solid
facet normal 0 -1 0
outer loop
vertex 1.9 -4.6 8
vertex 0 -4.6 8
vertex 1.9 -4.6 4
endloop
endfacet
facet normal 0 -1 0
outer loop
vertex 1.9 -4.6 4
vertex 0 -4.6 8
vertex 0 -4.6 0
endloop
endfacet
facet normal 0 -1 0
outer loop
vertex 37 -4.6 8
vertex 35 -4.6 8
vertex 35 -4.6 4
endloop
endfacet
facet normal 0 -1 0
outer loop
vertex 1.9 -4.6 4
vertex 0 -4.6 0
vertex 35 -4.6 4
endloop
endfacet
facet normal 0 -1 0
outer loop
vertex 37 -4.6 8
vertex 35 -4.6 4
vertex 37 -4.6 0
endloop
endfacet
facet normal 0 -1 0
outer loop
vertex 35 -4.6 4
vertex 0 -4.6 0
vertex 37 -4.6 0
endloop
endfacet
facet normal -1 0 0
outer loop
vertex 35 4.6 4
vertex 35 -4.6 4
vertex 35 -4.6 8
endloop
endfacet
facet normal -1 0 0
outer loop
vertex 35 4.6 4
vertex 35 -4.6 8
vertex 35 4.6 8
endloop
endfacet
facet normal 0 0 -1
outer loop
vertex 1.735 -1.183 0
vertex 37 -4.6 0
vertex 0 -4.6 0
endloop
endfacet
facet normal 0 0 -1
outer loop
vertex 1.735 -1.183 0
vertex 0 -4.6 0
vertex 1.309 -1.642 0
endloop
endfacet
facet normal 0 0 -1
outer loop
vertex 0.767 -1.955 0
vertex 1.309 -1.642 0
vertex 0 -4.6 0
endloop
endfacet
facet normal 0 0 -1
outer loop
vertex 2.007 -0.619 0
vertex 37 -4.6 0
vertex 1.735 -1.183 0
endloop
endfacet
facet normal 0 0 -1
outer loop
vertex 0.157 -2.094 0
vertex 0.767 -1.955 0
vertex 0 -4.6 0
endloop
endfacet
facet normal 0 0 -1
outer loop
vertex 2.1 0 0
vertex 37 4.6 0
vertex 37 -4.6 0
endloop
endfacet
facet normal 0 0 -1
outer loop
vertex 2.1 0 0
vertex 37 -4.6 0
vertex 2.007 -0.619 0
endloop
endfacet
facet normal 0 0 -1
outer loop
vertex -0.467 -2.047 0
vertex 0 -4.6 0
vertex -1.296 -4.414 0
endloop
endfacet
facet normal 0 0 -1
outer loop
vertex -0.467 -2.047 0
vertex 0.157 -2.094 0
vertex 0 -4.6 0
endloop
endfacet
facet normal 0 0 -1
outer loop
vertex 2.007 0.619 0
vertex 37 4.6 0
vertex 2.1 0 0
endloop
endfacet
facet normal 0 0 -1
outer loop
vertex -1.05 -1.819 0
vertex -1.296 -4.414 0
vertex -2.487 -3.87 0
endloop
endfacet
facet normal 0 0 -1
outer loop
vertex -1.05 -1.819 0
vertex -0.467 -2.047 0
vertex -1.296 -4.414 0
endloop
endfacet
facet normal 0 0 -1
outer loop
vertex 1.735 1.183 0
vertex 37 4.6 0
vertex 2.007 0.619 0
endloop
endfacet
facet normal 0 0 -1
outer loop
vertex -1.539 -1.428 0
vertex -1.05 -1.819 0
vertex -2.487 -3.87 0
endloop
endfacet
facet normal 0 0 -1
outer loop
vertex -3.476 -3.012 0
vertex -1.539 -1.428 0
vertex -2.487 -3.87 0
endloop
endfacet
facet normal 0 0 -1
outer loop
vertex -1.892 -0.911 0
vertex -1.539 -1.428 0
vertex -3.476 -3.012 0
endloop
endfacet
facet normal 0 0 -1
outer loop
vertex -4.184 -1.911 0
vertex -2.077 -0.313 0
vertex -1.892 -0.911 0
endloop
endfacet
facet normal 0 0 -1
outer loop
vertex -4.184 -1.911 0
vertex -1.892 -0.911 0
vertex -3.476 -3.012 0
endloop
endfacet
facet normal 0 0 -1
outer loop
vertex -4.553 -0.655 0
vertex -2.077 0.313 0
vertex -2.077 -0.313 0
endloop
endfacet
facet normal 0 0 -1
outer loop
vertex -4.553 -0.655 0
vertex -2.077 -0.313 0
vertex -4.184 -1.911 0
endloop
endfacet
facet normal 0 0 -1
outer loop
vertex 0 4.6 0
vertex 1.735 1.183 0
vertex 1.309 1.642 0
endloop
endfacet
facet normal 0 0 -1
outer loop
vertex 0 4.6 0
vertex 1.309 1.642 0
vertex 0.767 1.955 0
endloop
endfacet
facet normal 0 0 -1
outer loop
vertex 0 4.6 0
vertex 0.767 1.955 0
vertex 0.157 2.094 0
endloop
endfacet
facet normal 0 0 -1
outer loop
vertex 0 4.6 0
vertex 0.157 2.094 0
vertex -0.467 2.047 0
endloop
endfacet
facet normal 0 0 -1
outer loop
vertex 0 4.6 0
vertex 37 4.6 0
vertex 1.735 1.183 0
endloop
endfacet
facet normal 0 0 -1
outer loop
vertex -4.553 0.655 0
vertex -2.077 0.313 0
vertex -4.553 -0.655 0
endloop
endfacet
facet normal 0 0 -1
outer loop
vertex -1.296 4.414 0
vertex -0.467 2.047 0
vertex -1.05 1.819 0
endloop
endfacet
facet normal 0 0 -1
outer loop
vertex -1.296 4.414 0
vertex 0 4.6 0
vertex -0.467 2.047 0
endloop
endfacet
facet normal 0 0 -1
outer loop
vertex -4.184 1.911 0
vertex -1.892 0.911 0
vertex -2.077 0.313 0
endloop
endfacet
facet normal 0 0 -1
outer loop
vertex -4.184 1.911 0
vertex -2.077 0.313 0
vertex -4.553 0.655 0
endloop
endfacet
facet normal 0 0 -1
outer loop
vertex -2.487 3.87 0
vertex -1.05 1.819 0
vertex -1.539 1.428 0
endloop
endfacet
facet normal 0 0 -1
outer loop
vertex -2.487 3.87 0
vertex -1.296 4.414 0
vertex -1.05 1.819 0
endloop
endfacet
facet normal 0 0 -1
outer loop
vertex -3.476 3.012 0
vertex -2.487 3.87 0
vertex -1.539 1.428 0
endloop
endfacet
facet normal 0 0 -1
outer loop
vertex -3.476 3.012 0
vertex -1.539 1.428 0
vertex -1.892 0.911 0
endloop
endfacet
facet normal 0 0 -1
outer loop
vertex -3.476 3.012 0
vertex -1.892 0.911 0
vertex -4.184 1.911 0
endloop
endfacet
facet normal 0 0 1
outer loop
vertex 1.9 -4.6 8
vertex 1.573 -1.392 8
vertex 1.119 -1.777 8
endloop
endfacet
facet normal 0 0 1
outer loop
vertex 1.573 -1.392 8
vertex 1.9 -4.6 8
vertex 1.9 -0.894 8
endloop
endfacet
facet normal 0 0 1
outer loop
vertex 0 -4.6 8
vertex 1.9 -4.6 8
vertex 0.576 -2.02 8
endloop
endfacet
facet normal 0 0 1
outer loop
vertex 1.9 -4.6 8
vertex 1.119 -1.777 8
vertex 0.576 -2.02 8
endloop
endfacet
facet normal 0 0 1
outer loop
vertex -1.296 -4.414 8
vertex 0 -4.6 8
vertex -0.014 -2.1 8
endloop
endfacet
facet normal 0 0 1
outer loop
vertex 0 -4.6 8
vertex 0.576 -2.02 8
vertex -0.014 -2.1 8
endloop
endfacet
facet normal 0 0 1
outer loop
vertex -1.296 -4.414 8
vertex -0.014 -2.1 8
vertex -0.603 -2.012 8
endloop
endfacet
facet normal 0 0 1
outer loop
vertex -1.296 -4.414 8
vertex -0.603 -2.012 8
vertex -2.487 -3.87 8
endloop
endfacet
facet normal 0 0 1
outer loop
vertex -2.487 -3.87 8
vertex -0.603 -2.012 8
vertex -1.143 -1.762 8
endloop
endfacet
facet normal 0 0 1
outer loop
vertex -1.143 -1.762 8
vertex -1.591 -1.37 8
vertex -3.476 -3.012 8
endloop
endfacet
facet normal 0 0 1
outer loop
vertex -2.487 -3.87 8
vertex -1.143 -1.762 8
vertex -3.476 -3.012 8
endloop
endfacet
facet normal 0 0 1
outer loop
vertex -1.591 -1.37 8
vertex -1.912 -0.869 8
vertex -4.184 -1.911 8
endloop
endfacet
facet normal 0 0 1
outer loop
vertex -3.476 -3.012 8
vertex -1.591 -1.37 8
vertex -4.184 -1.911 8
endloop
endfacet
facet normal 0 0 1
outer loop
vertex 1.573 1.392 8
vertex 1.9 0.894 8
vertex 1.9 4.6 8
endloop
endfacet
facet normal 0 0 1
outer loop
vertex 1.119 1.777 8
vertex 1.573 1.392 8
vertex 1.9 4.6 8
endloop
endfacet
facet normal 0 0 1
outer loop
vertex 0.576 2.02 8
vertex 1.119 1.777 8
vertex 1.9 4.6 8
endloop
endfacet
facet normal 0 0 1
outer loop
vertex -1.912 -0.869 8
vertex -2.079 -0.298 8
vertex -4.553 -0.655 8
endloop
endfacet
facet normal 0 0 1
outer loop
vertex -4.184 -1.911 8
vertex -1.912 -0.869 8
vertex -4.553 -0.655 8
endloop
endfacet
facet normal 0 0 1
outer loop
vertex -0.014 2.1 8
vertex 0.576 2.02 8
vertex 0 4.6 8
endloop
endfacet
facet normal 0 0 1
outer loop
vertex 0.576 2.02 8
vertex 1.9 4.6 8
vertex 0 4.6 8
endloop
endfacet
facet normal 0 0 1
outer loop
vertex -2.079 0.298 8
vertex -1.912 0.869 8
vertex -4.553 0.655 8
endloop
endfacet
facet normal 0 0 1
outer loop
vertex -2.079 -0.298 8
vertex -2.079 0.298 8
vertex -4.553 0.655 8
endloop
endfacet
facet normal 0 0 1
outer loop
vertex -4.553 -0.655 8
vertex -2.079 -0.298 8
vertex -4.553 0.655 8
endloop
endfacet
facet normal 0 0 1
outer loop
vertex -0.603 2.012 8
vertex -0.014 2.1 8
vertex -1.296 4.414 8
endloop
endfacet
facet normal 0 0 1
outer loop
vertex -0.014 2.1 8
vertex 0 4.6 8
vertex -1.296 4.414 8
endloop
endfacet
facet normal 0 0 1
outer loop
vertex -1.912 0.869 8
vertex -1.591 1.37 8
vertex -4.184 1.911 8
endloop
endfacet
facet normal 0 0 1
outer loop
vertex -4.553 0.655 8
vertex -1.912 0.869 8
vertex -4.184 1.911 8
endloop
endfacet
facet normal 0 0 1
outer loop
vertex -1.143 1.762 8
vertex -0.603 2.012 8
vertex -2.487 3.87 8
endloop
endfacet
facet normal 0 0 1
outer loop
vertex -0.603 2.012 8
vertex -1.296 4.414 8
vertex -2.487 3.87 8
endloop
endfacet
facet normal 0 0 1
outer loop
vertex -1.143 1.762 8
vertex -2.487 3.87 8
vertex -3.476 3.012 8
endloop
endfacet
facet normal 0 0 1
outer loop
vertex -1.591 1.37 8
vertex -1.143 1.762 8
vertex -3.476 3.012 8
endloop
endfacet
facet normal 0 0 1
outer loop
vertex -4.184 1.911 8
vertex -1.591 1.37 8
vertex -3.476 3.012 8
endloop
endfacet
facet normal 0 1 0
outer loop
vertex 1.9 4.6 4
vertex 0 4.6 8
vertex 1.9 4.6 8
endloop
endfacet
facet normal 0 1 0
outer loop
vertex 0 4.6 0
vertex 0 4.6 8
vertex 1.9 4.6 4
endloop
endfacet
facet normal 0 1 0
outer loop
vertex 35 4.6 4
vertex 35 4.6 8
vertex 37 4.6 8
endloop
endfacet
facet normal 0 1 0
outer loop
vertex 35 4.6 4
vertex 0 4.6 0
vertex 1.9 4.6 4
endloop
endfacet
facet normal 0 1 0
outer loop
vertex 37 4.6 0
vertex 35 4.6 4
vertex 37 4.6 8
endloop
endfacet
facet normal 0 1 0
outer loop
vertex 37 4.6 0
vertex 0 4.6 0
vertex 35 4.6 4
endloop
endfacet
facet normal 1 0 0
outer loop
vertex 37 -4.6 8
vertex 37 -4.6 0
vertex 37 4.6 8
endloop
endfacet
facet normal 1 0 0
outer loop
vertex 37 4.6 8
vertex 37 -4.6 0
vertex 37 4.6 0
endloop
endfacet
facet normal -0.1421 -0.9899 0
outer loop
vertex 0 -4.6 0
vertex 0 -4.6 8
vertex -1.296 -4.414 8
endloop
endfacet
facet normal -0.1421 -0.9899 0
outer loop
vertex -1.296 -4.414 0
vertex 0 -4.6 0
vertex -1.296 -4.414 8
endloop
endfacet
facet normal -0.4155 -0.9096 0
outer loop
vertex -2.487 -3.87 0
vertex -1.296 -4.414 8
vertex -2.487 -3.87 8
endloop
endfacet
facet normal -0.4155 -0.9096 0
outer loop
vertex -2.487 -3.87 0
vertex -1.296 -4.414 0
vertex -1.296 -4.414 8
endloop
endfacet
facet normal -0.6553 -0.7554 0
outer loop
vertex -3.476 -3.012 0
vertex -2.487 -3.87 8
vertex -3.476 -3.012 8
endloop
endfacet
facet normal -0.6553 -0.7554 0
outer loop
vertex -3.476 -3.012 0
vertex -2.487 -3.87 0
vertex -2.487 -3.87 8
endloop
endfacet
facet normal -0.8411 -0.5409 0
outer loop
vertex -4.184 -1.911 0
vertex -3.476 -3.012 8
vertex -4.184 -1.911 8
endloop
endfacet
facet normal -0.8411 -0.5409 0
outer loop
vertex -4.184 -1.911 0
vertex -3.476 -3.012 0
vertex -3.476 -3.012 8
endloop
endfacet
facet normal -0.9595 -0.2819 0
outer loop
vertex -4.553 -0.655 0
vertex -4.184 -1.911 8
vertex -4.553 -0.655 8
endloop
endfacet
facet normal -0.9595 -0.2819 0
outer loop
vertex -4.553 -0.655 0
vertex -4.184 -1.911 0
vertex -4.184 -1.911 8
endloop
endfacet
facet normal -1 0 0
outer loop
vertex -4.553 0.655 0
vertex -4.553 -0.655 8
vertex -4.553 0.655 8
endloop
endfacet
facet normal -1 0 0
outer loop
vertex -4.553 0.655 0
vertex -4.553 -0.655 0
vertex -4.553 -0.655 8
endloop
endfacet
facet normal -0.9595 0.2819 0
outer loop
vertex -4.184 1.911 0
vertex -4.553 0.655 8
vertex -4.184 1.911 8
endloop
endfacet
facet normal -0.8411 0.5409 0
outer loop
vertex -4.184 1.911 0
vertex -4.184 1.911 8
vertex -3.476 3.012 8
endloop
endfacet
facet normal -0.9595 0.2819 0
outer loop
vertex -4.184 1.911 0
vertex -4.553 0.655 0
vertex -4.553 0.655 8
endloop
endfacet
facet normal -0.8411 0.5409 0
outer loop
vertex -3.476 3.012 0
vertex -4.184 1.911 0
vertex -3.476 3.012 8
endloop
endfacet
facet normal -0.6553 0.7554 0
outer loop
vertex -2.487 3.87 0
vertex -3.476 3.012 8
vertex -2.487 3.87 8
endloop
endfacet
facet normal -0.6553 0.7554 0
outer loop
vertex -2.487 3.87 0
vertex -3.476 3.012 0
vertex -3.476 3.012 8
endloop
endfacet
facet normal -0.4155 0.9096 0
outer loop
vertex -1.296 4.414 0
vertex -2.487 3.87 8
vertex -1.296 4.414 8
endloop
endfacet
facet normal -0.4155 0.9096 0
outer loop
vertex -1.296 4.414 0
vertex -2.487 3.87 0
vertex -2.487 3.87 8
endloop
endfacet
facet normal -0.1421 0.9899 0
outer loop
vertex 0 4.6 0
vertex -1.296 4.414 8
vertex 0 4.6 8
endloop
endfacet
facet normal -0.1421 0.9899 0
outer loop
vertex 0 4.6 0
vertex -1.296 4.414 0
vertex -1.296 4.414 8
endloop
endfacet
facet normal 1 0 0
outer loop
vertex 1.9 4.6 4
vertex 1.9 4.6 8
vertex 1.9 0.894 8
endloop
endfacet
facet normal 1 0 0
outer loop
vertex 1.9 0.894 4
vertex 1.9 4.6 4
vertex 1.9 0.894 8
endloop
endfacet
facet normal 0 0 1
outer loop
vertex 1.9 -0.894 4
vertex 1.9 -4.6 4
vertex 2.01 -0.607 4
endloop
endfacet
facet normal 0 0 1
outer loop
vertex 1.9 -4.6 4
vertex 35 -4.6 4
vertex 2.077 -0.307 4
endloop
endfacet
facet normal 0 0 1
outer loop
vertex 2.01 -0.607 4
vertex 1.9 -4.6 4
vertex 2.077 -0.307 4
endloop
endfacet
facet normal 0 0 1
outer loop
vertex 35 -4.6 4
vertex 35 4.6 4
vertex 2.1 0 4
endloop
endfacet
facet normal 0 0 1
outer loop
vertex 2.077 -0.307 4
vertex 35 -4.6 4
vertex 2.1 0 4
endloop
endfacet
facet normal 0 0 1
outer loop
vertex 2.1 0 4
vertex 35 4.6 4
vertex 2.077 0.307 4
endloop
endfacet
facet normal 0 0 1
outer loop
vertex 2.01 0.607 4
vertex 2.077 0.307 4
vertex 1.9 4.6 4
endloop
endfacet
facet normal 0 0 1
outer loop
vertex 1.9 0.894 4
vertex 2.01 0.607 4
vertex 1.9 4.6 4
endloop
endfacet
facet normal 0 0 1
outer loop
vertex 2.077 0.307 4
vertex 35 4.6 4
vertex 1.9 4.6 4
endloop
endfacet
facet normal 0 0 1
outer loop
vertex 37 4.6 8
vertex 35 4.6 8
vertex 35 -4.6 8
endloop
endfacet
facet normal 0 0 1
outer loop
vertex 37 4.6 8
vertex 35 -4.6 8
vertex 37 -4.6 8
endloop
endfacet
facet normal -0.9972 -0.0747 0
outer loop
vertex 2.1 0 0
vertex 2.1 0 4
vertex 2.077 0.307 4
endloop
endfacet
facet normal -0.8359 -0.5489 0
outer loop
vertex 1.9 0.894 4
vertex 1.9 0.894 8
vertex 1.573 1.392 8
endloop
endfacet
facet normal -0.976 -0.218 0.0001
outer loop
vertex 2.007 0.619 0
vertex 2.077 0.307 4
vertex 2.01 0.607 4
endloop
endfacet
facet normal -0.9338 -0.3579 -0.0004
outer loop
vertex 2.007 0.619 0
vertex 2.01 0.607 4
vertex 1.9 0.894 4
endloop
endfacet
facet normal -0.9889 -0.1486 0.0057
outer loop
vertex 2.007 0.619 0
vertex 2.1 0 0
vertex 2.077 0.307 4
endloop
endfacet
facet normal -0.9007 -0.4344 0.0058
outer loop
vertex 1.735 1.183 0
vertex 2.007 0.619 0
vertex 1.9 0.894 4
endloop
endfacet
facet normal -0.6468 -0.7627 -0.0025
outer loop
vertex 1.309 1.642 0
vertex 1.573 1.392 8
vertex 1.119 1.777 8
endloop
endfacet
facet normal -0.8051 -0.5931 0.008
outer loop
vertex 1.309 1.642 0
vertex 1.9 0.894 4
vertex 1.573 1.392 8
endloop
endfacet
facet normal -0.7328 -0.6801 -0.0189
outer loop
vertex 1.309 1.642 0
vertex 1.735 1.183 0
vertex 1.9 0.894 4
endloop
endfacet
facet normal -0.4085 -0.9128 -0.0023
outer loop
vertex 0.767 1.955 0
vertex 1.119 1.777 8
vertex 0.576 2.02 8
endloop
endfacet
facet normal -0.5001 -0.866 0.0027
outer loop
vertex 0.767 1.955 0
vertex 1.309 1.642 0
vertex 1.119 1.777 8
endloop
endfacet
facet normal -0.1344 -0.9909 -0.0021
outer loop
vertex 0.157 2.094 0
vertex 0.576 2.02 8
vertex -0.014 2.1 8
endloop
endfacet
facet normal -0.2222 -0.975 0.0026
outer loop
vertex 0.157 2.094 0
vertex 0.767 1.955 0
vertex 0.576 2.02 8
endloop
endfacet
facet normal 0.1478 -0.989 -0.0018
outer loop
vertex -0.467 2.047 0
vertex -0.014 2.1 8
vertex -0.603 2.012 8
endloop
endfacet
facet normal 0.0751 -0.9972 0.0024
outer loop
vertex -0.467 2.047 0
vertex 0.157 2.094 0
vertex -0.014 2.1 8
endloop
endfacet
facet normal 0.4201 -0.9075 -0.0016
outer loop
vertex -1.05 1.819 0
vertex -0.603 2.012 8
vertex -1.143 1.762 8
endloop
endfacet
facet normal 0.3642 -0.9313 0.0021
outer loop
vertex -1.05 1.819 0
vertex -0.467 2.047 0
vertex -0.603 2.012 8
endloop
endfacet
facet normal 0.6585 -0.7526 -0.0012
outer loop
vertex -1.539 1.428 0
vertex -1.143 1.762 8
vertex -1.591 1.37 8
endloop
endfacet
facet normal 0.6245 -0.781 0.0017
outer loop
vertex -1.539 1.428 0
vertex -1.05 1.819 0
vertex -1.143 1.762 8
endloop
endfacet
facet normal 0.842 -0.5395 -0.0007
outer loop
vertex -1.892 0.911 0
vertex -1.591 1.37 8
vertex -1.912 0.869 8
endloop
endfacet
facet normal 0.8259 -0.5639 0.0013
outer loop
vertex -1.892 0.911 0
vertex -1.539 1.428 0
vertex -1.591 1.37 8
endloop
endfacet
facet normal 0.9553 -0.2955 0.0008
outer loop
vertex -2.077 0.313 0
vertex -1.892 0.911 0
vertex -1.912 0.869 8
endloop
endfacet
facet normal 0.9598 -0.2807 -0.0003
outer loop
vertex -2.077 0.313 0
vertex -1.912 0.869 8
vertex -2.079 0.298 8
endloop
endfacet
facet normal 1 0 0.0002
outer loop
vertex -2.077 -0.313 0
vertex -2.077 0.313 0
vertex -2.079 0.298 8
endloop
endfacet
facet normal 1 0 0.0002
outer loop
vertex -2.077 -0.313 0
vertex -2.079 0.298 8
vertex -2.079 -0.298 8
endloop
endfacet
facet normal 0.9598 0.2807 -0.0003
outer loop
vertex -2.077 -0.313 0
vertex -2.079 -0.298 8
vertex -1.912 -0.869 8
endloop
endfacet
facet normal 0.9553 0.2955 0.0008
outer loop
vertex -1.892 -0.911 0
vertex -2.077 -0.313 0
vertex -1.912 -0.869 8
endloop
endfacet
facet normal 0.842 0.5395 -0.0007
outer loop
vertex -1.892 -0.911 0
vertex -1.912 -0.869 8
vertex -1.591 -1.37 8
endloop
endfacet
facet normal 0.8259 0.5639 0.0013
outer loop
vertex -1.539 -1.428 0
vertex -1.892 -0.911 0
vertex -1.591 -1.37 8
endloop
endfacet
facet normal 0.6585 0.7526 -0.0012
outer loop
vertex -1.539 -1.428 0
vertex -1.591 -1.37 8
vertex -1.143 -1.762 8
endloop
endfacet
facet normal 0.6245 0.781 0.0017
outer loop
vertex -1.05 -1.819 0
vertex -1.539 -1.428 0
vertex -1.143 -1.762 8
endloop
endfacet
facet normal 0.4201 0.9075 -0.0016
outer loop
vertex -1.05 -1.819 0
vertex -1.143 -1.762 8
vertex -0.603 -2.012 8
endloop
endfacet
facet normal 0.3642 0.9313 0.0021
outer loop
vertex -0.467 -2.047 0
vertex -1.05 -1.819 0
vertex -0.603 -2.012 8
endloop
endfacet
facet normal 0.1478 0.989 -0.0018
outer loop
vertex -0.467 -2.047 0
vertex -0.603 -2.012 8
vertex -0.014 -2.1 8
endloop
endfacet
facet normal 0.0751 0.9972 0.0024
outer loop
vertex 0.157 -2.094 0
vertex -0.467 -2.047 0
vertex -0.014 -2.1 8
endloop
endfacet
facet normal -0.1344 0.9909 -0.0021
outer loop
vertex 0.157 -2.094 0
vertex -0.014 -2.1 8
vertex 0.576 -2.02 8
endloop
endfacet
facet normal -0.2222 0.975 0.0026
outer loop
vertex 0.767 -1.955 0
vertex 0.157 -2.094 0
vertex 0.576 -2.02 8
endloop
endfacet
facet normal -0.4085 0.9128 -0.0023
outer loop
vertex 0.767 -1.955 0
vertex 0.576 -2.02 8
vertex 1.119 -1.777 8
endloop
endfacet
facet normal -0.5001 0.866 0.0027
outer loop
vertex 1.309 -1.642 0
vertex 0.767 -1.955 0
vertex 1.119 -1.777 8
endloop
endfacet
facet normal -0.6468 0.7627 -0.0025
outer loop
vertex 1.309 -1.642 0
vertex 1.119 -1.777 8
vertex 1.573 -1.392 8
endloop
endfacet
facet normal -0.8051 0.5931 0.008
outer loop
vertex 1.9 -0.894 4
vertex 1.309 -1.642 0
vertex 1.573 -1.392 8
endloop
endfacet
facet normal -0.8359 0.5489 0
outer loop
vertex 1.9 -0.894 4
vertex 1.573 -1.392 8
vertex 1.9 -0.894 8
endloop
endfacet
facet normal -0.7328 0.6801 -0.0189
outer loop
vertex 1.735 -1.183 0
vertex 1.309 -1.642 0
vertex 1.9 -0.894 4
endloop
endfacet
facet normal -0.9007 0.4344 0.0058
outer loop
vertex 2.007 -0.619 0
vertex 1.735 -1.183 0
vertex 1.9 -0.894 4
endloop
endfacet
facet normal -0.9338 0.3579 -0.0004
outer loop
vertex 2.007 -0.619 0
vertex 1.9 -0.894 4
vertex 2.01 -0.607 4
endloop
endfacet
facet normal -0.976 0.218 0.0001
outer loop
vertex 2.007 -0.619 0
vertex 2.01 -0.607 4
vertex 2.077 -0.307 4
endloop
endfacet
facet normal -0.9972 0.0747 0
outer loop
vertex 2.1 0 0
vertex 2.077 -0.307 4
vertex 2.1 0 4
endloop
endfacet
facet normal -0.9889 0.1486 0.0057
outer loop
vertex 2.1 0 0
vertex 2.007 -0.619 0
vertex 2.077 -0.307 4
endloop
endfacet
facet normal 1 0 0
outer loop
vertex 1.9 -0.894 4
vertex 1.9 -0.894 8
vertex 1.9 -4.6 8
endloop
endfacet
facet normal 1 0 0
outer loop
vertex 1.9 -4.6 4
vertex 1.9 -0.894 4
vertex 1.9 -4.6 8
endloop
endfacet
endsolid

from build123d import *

# Parameters (mm, degrees)
SKETCH2_R           = 2.1
BOSS_EXTRUDE2_DEPTH = 4
SKETCH3_W           = 2
SKETCH3_H           = 9.2
BOSS_EXTRUDE3_DEPTH = 4


with BuildPart() as part:
    # Sketch2 → Boss-Extrude2 (new body)
    with BuildSketch(Plane.XY):
        with BuildLine():
            Line((0, 4.6), (37, 4.6))
            Line((37, 4.6), (37, -4.6))
            Line((37, -4.6), (0, -4.6))
            ThreePointArc((0, -4.6), (-4.6, 0), (0, 4.6))
        make_face()
        Circle(SKETCH2_R, mode=Mode.SUBTRACT)
    extrude(amount=BOSS_EXTRUDE2_DEPTH)

    # Sketch3 → Boss-Extrude3 (add)
    with BuildSketch(Plane.XY.offset(4)):
        with Locations((36, 0)):
            Rectangle(SKETCH3_W, SKETCH3_H)
        with BuildLine():
            Line((1.9, 4.6), (1.9, 0.894427191))
            ThreePointArc((1.9, 0.894427191), (-2.1, 0), (1.9, -0.894427191))
            Line((1.9, -0.894427191), (1.9, -4.6))
            Line((1.9, -4.6), (0, -4.6))
            ThreePointArc((0, -4.6), (-4.6, 0), (0, 4.6))
            Line((0, 4.6), (1.9, 4.6))
        make_face()
    extrude(amount=BOSS_EXTRUDE3_DEPTH)


solid = part.part
